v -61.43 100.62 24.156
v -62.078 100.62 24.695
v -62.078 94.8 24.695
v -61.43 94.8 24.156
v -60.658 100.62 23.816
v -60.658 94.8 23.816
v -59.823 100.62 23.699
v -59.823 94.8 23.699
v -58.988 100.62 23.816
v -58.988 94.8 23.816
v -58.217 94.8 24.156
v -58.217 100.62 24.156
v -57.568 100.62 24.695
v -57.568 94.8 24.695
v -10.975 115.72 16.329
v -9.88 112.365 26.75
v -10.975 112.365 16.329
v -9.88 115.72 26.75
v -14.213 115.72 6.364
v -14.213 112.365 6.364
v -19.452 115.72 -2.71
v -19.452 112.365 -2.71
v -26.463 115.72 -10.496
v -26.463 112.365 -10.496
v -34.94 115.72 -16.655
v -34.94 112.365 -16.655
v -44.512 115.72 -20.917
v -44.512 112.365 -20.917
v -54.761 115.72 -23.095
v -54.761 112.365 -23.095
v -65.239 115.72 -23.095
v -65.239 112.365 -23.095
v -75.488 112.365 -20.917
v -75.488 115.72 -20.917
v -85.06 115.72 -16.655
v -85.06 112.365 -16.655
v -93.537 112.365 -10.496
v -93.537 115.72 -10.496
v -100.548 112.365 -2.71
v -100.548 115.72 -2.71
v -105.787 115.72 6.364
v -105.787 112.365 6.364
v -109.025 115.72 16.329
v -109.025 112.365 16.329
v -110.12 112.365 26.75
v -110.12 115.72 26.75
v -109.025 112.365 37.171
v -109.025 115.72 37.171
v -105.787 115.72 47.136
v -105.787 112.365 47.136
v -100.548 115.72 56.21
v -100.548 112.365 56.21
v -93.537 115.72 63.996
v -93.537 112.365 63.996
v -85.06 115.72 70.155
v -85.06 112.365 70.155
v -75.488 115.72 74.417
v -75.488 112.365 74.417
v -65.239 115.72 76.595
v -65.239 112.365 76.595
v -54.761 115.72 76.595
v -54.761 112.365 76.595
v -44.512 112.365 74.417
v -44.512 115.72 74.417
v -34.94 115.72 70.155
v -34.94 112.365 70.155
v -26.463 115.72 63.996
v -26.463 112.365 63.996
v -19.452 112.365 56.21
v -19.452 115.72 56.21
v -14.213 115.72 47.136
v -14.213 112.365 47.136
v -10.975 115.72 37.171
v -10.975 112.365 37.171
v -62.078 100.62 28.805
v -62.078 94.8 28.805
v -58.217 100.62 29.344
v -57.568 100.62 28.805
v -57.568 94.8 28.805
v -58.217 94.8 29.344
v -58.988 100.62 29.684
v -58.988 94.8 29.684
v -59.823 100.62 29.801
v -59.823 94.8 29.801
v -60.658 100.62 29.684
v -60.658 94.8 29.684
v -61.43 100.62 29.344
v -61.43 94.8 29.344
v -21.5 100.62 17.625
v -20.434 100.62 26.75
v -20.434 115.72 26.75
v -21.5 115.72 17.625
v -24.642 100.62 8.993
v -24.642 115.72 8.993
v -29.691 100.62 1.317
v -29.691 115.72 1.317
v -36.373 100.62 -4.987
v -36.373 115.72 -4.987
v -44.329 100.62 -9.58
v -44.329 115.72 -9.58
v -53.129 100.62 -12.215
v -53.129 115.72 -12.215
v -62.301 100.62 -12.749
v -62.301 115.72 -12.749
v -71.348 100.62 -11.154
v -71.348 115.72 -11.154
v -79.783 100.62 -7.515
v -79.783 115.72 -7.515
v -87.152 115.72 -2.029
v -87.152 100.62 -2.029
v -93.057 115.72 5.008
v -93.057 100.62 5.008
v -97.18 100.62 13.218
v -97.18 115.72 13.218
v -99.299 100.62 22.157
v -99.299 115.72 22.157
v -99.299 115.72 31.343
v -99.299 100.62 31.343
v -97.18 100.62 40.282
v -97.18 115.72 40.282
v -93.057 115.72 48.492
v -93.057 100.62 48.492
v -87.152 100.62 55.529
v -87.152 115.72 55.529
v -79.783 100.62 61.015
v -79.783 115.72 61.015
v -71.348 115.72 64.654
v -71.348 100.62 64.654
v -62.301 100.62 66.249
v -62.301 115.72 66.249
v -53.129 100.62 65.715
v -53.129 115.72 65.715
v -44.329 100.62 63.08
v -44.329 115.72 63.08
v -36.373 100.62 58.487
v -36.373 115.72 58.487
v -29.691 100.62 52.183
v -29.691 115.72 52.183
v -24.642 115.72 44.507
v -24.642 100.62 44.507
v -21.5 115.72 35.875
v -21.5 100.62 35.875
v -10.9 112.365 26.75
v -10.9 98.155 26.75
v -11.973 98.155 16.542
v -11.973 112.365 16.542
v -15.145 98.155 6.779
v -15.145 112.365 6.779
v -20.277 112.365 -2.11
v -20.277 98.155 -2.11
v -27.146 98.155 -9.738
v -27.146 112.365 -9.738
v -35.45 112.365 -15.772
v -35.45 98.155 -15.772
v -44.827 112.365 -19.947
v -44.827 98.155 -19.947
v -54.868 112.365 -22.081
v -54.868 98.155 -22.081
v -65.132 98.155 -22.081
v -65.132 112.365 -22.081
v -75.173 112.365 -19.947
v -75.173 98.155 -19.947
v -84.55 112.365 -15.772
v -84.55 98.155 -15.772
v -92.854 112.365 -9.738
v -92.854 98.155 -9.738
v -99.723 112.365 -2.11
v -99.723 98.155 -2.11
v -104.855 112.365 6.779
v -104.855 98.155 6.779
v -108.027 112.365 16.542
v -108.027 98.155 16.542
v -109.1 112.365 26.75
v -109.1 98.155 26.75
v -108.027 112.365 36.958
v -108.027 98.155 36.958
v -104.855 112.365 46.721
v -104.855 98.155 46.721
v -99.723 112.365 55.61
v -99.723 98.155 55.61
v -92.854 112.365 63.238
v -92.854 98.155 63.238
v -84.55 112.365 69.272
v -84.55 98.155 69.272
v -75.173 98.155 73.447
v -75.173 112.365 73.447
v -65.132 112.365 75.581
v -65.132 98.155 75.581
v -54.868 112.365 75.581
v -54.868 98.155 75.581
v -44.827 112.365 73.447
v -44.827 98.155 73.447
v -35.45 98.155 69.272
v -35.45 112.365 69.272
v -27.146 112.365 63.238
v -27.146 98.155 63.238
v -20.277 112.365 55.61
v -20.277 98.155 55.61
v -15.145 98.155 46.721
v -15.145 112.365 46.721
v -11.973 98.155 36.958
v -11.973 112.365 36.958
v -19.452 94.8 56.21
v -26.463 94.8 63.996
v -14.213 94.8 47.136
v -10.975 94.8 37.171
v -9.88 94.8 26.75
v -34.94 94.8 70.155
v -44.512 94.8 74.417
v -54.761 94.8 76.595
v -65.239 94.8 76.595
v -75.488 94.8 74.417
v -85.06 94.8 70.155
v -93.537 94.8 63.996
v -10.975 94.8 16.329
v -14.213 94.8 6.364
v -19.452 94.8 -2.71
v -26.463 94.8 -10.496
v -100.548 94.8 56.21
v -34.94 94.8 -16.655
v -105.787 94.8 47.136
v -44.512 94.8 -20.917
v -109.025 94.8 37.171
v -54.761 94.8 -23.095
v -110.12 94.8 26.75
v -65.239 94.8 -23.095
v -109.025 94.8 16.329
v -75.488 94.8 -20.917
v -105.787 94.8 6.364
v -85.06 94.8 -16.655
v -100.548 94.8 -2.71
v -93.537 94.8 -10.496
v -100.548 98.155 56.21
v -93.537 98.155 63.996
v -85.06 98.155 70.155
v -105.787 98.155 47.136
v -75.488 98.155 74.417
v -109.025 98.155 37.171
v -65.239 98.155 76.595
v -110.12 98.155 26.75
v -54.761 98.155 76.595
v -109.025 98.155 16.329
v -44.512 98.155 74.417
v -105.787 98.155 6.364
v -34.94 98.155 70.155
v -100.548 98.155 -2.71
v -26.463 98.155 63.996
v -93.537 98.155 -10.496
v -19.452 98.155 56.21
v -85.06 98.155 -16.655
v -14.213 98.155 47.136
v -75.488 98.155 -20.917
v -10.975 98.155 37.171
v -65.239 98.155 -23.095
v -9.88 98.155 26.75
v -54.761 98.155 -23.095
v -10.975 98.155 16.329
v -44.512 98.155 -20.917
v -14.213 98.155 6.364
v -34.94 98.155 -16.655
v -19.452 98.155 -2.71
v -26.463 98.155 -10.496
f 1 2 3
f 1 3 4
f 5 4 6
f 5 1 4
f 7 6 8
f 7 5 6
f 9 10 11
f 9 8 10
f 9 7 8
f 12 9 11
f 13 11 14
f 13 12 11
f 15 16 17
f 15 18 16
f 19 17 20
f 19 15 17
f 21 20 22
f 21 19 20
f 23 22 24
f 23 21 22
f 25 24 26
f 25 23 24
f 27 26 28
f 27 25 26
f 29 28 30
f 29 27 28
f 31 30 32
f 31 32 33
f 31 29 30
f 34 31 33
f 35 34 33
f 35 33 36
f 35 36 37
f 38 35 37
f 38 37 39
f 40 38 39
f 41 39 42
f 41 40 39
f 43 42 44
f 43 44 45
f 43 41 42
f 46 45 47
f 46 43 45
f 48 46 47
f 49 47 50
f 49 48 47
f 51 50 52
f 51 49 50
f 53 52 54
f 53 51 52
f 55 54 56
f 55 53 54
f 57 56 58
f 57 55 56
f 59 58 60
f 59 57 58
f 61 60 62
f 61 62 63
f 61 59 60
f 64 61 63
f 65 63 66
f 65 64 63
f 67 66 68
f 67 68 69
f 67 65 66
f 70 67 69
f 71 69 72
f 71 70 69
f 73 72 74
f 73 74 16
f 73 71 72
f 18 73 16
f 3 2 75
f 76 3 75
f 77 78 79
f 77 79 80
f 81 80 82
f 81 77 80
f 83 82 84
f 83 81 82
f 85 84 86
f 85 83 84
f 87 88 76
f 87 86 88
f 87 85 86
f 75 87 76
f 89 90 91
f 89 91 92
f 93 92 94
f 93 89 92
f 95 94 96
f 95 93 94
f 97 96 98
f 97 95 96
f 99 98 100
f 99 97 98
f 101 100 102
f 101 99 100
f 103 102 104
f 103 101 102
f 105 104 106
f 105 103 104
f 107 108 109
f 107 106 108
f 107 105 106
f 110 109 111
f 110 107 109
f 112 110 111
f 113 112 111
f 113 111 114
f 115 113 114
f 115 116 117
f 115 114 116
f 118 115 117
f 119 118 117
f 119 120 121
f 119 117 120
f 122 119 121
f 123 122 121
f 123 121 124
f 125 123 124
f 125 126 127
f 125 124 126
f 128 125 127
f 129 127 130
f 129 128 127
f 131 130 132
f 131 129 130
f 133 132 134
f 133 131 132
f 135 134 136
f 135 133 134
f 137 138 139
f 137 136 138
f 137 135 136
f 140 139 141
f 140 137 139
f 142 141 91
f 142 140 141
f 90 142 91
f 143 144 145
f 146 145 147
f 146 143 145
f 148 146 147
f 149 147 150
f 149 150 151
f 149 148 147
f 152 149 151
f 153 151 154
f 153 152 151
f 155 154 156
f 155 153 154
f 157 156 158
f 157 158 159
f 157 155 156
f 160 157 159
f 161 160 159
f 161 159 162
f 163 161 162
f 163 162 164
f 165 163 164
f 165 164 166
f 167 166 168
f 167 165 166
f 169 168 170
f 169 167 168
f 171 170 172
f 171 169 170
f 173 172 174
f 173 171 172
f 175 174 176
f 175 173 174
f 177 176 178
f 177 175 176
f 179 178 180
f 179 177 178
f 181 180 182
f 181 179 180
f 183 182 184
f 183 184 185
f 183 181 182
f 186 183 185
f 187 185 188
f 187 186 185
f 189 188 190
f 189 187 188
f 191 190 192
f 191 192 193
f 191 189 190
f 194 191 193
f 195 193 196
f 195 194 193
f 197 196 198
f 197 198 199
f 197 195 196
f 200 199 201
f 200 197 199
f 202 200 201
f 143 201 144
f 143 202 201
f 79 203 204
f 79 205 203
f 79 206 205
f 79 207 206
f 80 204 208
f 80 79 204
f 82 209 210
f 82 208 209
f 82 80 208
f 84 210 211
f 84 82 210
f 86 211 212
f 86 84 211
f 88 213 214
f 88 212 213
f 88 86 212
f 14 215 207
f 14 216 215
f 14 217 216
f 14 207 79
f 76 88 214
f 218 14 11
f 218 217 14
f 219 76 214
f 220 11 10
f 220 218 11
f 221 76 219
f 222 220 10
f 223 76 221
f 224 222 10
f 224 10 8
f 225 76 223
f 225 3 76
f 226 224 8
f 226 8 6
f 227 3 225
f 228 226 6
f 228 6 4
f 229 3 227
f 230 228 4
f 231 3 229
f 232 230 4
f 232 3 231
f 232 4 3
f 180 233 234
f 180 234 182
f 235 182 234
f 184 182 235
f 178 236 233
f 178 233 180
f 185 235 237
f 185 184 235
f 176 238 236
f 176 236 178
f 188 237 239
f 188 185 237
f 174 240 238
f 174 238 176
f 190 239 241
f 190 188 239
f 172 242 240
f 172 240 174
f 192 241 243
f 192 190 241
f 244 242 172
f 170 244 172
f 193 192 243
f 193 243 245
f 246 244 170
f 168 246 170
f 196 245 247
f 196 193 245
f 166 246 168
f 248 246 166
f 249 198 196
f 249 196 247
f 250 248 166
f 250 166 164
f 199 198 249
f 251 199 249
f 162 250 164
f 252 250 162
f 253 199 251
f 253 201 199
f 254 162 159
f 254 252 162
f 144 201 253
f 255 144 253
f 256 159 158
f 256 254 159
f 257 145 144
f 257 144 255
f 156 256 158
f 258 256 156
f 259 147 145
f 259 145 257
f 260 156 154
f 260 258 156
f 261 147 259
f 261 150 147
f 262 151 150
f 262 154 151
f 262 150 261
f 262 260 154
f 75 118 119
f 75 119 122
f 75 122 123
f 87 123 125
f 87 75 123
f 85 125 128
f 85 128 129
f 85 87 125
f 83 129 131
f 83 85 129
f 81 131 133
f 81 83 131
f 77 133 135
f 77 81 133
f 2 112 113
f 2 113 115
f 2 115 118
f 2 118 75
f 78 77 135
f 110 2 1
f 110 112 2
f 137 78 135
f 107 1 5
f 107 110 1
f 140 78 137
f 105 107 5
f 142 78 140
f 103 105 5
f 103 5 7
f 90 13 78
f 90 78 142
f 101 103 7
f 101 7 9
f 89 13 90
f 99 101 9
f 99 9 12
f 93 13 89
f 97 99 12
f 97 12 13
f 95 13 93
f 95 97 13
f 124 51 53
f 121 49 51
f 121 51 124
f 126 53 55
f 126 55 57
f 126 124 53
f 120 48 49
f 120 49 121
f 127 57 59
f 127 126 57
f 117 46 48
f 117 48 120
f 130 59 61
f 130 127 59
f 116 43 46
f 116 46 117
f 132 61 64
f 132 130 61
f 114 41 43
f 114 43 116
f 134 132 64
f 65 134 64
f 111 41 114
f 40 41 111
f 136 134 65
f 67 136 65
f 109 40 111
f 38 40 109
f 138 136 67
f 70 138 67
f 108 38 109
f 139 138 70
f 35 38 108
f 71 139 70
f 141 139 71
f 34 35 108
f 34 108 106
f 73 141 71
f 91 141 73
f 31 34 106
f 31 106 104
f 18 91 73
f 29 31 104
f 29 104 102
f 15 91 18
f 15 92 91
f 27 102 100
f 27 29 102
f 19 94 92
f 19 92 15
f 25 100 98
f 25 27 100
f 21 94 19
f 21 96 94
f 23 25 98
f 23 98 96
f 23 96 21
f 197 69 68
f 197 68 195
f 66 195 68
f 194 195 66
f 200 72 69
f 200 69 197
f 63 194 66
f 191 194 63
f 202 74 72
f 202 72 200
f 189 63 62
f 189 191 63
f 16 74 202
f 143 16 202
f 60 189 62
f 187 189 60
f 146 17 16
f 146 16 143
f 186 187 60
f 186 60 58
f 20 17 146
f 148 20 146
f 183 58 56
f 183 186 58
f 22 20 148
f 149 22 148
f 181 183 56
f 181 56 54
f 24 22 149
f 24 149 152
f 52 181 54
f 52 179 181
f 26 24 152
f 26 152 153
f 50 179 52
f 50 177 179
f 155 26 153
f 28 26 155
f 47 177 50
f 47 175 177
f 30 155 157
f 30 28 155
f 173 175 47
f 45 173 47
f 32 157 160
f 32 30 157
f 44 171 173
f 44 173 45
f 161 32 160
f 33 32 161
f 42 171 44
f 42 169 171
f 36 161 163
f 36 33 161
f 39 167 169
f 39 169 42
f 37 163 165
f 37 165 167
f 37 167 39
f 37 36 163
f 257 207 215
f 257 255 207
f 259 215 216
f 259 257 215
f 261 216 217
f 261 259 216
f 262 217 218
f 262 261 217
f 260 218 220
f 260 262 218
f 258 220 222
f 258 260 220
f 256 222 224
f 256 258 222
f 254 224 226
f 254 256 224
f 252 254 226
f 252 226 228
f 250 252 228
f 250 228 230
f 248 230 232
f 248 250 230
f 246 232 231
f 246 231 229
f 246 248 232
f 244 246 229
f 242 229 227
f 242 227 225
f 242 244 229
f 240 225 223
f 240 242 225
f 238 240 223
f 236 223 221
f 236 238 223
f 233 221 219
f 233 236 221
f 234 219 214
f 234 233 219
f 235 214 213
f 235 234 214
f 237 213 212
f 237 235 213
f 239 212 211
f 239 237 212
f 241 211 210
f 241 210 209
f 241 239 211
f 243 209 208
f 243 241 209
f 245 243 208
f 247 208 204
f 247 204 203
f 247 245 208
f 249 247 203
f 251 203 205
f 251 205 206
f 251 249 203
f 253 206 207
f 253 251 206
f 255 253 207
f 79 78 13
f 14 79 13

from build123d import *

# Parameters (mm, degrees)
EXTRUDE198_DEPTH           = 40
EXTRUDE198_ROLL_ANGLE      = -90
EXTRUDE198_PLACEMENT_ANGLE = 90
SKETCH181_R                = 39.566192
EXTRUDE197_DEPTH           = 20
CUT124_PLACEMENT_ANGLE     = 270


with BuildPart() as pieza_clave_motor011:
    # Sketch182 → Extrude198 (new body)
    with BuildSketch(Plane(origin=(0, -17.4, 11), x_dir=(-1, 0, 0), z_dir=(0, 1, 0))):
        with BuildLine():
            Line((-2.055, -8.921835), (2.055, -8.921835))
            ThreePointArc((2.055, -13.431835), (3.05091, -11.176835), (2.055, -8.921835))
            Line((2.055, -13.431835), (-2.055, -13.431835))
            ThreePointArc((-2.055, -8.921835), (-3.05091, -11.176835), (-2.055, -13.431835))
        make_face()
    extrude(amount=EXTRUDE198_DEPTH)


with BuildPart() as pieza_clave_motor011_1:
    # Extrude198 roll: moved
    add(pieza_clave_motor011.part.rotate(Axis((0, 0, 0), (1, 0, 0)), EXTRUDE198_ROLL_ANGLE))


with BuildPart() as pieza_clave_motor011_2:
    # Extrude198 placement: moved
    add(pieza_clave_motor011_1.part.moved(Location((0, 0, 13.85))).rotate(Axis((0, 0, 13.85), (0, 0, 1)), EXTRUDE198_PLACEMENT_ANGLE))


with BuildPart() as extrude197:
    # Sketch181 (on Face7 of Revolve004) → Extrude197 (new body)
    with BuildSketch(Plane.XY.offset(20.92)):
        Circle(SKETCH181_R)
    extrude(amount=EXTRUDE197_DEPTH)


with BuildPart() as extrude197_1:
    # Extrude197 placement: moved
    add(extrude197.part.moved(Location((0, 0, -15.1))))


with BuildPart() as rueda_trasera001:
    # Sketch180 → Revolve004 (revolve)
    with BuildSketch(Plane.XZ):
        Polygon((0, 0), (50.12, 0), (50.12, 3.355495), (49.1, 3.355495), (49.1, 17.564505), (50.12, 17.564505), (50.12, 20.92), (0, 20.92), align=None)
    revolve(axis=Axis((0, 0, 0), (0, 0, 1)))

    # Cut125: cut Extrude197
    add(extrude197_1.part, mode=Mode.SUBTRACT)

    # Cut124: cut Pieza Clave motor011
    add(pieza_clave_motor011_2.part, mode=Mode.SUBTRACT)


with BuildPart() as rueda_trasera001_1:
    # Cut124 placement: moved
    add(rueda_trasera001.part.moved(Location((-60, 94.8, 26.75))).rotate(Axis((-60, 94.8, 26.75), (1, 0, 0)), CUT124_PLACEMENT_ANGLE))


solid = rueda_trasera001_1.part
